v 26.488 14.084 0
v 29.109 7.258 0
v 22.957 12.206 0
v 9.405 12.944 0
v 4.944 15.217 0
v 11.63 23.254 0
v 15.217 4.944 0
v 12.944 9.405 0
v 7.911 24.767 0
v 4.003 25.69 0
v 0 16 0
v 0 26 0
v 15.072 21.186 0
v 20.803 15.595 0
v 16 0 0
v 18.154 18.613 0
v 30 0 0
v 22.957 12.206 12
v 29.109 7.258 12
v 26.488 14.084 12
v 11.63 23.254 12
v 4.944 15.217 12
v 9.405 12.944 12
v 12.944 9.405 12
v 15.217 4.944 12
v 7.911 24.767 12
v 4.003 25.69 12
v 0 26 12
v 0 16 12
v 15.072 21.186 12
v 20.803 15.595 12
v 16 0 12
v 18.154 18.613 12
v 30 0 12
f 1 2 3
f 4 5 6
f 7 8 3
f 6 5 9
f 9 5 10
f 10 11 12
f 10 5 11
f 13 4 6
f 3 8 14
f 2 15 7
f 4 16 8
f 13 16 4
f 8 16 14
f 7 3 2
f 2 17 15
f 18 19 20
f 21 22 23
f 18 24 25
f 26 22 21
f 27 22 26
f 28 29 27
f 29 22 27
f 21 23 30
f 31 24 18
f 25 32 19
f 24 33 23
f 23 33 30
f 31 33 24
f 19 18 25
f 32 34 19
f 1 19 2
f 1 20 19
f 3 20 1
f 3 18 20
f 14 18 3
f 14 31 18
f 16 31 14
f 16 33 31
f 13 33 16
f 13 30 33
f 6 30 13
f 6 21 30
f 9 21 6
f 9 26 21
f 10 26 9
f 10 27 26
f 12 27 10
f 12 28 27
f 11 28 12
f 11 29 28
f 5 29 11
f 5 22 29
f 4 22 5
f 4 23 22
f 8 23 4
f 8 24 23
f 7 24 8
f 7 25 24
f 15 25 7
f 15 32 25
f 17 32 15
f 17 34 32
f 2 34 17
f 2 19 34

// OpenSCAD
$fn = 32;

// ----------------------------------------------------------------------
// Arc stop: segment, 12 mm thick
// ----------------------------------------------------------------------

// --- parameters (mm) ---
profile_height = 12;      // extrusion height
profile_points = 17;      // points of the closed outline

profile = [[30, 0], [29.109, 7.258], [26.488, 14.084], [22.957, 12.206], [20.803, 15.595], [18.154, 18.613], [15.072, 21.186], [11.63, 23.254], [7.911, 24.767], [4.003, 25.69], [0, 26], [0, 16], [4.944, 15.217], [9.405, 12.944], [12.944, 9.405], [15.217, 4.944], [16, 0]];  // single closed polygon, 17 points, counter clockwise

// --- the one profile operation ---
linear_extrude(height = profile_height) polygon(points = profile);
